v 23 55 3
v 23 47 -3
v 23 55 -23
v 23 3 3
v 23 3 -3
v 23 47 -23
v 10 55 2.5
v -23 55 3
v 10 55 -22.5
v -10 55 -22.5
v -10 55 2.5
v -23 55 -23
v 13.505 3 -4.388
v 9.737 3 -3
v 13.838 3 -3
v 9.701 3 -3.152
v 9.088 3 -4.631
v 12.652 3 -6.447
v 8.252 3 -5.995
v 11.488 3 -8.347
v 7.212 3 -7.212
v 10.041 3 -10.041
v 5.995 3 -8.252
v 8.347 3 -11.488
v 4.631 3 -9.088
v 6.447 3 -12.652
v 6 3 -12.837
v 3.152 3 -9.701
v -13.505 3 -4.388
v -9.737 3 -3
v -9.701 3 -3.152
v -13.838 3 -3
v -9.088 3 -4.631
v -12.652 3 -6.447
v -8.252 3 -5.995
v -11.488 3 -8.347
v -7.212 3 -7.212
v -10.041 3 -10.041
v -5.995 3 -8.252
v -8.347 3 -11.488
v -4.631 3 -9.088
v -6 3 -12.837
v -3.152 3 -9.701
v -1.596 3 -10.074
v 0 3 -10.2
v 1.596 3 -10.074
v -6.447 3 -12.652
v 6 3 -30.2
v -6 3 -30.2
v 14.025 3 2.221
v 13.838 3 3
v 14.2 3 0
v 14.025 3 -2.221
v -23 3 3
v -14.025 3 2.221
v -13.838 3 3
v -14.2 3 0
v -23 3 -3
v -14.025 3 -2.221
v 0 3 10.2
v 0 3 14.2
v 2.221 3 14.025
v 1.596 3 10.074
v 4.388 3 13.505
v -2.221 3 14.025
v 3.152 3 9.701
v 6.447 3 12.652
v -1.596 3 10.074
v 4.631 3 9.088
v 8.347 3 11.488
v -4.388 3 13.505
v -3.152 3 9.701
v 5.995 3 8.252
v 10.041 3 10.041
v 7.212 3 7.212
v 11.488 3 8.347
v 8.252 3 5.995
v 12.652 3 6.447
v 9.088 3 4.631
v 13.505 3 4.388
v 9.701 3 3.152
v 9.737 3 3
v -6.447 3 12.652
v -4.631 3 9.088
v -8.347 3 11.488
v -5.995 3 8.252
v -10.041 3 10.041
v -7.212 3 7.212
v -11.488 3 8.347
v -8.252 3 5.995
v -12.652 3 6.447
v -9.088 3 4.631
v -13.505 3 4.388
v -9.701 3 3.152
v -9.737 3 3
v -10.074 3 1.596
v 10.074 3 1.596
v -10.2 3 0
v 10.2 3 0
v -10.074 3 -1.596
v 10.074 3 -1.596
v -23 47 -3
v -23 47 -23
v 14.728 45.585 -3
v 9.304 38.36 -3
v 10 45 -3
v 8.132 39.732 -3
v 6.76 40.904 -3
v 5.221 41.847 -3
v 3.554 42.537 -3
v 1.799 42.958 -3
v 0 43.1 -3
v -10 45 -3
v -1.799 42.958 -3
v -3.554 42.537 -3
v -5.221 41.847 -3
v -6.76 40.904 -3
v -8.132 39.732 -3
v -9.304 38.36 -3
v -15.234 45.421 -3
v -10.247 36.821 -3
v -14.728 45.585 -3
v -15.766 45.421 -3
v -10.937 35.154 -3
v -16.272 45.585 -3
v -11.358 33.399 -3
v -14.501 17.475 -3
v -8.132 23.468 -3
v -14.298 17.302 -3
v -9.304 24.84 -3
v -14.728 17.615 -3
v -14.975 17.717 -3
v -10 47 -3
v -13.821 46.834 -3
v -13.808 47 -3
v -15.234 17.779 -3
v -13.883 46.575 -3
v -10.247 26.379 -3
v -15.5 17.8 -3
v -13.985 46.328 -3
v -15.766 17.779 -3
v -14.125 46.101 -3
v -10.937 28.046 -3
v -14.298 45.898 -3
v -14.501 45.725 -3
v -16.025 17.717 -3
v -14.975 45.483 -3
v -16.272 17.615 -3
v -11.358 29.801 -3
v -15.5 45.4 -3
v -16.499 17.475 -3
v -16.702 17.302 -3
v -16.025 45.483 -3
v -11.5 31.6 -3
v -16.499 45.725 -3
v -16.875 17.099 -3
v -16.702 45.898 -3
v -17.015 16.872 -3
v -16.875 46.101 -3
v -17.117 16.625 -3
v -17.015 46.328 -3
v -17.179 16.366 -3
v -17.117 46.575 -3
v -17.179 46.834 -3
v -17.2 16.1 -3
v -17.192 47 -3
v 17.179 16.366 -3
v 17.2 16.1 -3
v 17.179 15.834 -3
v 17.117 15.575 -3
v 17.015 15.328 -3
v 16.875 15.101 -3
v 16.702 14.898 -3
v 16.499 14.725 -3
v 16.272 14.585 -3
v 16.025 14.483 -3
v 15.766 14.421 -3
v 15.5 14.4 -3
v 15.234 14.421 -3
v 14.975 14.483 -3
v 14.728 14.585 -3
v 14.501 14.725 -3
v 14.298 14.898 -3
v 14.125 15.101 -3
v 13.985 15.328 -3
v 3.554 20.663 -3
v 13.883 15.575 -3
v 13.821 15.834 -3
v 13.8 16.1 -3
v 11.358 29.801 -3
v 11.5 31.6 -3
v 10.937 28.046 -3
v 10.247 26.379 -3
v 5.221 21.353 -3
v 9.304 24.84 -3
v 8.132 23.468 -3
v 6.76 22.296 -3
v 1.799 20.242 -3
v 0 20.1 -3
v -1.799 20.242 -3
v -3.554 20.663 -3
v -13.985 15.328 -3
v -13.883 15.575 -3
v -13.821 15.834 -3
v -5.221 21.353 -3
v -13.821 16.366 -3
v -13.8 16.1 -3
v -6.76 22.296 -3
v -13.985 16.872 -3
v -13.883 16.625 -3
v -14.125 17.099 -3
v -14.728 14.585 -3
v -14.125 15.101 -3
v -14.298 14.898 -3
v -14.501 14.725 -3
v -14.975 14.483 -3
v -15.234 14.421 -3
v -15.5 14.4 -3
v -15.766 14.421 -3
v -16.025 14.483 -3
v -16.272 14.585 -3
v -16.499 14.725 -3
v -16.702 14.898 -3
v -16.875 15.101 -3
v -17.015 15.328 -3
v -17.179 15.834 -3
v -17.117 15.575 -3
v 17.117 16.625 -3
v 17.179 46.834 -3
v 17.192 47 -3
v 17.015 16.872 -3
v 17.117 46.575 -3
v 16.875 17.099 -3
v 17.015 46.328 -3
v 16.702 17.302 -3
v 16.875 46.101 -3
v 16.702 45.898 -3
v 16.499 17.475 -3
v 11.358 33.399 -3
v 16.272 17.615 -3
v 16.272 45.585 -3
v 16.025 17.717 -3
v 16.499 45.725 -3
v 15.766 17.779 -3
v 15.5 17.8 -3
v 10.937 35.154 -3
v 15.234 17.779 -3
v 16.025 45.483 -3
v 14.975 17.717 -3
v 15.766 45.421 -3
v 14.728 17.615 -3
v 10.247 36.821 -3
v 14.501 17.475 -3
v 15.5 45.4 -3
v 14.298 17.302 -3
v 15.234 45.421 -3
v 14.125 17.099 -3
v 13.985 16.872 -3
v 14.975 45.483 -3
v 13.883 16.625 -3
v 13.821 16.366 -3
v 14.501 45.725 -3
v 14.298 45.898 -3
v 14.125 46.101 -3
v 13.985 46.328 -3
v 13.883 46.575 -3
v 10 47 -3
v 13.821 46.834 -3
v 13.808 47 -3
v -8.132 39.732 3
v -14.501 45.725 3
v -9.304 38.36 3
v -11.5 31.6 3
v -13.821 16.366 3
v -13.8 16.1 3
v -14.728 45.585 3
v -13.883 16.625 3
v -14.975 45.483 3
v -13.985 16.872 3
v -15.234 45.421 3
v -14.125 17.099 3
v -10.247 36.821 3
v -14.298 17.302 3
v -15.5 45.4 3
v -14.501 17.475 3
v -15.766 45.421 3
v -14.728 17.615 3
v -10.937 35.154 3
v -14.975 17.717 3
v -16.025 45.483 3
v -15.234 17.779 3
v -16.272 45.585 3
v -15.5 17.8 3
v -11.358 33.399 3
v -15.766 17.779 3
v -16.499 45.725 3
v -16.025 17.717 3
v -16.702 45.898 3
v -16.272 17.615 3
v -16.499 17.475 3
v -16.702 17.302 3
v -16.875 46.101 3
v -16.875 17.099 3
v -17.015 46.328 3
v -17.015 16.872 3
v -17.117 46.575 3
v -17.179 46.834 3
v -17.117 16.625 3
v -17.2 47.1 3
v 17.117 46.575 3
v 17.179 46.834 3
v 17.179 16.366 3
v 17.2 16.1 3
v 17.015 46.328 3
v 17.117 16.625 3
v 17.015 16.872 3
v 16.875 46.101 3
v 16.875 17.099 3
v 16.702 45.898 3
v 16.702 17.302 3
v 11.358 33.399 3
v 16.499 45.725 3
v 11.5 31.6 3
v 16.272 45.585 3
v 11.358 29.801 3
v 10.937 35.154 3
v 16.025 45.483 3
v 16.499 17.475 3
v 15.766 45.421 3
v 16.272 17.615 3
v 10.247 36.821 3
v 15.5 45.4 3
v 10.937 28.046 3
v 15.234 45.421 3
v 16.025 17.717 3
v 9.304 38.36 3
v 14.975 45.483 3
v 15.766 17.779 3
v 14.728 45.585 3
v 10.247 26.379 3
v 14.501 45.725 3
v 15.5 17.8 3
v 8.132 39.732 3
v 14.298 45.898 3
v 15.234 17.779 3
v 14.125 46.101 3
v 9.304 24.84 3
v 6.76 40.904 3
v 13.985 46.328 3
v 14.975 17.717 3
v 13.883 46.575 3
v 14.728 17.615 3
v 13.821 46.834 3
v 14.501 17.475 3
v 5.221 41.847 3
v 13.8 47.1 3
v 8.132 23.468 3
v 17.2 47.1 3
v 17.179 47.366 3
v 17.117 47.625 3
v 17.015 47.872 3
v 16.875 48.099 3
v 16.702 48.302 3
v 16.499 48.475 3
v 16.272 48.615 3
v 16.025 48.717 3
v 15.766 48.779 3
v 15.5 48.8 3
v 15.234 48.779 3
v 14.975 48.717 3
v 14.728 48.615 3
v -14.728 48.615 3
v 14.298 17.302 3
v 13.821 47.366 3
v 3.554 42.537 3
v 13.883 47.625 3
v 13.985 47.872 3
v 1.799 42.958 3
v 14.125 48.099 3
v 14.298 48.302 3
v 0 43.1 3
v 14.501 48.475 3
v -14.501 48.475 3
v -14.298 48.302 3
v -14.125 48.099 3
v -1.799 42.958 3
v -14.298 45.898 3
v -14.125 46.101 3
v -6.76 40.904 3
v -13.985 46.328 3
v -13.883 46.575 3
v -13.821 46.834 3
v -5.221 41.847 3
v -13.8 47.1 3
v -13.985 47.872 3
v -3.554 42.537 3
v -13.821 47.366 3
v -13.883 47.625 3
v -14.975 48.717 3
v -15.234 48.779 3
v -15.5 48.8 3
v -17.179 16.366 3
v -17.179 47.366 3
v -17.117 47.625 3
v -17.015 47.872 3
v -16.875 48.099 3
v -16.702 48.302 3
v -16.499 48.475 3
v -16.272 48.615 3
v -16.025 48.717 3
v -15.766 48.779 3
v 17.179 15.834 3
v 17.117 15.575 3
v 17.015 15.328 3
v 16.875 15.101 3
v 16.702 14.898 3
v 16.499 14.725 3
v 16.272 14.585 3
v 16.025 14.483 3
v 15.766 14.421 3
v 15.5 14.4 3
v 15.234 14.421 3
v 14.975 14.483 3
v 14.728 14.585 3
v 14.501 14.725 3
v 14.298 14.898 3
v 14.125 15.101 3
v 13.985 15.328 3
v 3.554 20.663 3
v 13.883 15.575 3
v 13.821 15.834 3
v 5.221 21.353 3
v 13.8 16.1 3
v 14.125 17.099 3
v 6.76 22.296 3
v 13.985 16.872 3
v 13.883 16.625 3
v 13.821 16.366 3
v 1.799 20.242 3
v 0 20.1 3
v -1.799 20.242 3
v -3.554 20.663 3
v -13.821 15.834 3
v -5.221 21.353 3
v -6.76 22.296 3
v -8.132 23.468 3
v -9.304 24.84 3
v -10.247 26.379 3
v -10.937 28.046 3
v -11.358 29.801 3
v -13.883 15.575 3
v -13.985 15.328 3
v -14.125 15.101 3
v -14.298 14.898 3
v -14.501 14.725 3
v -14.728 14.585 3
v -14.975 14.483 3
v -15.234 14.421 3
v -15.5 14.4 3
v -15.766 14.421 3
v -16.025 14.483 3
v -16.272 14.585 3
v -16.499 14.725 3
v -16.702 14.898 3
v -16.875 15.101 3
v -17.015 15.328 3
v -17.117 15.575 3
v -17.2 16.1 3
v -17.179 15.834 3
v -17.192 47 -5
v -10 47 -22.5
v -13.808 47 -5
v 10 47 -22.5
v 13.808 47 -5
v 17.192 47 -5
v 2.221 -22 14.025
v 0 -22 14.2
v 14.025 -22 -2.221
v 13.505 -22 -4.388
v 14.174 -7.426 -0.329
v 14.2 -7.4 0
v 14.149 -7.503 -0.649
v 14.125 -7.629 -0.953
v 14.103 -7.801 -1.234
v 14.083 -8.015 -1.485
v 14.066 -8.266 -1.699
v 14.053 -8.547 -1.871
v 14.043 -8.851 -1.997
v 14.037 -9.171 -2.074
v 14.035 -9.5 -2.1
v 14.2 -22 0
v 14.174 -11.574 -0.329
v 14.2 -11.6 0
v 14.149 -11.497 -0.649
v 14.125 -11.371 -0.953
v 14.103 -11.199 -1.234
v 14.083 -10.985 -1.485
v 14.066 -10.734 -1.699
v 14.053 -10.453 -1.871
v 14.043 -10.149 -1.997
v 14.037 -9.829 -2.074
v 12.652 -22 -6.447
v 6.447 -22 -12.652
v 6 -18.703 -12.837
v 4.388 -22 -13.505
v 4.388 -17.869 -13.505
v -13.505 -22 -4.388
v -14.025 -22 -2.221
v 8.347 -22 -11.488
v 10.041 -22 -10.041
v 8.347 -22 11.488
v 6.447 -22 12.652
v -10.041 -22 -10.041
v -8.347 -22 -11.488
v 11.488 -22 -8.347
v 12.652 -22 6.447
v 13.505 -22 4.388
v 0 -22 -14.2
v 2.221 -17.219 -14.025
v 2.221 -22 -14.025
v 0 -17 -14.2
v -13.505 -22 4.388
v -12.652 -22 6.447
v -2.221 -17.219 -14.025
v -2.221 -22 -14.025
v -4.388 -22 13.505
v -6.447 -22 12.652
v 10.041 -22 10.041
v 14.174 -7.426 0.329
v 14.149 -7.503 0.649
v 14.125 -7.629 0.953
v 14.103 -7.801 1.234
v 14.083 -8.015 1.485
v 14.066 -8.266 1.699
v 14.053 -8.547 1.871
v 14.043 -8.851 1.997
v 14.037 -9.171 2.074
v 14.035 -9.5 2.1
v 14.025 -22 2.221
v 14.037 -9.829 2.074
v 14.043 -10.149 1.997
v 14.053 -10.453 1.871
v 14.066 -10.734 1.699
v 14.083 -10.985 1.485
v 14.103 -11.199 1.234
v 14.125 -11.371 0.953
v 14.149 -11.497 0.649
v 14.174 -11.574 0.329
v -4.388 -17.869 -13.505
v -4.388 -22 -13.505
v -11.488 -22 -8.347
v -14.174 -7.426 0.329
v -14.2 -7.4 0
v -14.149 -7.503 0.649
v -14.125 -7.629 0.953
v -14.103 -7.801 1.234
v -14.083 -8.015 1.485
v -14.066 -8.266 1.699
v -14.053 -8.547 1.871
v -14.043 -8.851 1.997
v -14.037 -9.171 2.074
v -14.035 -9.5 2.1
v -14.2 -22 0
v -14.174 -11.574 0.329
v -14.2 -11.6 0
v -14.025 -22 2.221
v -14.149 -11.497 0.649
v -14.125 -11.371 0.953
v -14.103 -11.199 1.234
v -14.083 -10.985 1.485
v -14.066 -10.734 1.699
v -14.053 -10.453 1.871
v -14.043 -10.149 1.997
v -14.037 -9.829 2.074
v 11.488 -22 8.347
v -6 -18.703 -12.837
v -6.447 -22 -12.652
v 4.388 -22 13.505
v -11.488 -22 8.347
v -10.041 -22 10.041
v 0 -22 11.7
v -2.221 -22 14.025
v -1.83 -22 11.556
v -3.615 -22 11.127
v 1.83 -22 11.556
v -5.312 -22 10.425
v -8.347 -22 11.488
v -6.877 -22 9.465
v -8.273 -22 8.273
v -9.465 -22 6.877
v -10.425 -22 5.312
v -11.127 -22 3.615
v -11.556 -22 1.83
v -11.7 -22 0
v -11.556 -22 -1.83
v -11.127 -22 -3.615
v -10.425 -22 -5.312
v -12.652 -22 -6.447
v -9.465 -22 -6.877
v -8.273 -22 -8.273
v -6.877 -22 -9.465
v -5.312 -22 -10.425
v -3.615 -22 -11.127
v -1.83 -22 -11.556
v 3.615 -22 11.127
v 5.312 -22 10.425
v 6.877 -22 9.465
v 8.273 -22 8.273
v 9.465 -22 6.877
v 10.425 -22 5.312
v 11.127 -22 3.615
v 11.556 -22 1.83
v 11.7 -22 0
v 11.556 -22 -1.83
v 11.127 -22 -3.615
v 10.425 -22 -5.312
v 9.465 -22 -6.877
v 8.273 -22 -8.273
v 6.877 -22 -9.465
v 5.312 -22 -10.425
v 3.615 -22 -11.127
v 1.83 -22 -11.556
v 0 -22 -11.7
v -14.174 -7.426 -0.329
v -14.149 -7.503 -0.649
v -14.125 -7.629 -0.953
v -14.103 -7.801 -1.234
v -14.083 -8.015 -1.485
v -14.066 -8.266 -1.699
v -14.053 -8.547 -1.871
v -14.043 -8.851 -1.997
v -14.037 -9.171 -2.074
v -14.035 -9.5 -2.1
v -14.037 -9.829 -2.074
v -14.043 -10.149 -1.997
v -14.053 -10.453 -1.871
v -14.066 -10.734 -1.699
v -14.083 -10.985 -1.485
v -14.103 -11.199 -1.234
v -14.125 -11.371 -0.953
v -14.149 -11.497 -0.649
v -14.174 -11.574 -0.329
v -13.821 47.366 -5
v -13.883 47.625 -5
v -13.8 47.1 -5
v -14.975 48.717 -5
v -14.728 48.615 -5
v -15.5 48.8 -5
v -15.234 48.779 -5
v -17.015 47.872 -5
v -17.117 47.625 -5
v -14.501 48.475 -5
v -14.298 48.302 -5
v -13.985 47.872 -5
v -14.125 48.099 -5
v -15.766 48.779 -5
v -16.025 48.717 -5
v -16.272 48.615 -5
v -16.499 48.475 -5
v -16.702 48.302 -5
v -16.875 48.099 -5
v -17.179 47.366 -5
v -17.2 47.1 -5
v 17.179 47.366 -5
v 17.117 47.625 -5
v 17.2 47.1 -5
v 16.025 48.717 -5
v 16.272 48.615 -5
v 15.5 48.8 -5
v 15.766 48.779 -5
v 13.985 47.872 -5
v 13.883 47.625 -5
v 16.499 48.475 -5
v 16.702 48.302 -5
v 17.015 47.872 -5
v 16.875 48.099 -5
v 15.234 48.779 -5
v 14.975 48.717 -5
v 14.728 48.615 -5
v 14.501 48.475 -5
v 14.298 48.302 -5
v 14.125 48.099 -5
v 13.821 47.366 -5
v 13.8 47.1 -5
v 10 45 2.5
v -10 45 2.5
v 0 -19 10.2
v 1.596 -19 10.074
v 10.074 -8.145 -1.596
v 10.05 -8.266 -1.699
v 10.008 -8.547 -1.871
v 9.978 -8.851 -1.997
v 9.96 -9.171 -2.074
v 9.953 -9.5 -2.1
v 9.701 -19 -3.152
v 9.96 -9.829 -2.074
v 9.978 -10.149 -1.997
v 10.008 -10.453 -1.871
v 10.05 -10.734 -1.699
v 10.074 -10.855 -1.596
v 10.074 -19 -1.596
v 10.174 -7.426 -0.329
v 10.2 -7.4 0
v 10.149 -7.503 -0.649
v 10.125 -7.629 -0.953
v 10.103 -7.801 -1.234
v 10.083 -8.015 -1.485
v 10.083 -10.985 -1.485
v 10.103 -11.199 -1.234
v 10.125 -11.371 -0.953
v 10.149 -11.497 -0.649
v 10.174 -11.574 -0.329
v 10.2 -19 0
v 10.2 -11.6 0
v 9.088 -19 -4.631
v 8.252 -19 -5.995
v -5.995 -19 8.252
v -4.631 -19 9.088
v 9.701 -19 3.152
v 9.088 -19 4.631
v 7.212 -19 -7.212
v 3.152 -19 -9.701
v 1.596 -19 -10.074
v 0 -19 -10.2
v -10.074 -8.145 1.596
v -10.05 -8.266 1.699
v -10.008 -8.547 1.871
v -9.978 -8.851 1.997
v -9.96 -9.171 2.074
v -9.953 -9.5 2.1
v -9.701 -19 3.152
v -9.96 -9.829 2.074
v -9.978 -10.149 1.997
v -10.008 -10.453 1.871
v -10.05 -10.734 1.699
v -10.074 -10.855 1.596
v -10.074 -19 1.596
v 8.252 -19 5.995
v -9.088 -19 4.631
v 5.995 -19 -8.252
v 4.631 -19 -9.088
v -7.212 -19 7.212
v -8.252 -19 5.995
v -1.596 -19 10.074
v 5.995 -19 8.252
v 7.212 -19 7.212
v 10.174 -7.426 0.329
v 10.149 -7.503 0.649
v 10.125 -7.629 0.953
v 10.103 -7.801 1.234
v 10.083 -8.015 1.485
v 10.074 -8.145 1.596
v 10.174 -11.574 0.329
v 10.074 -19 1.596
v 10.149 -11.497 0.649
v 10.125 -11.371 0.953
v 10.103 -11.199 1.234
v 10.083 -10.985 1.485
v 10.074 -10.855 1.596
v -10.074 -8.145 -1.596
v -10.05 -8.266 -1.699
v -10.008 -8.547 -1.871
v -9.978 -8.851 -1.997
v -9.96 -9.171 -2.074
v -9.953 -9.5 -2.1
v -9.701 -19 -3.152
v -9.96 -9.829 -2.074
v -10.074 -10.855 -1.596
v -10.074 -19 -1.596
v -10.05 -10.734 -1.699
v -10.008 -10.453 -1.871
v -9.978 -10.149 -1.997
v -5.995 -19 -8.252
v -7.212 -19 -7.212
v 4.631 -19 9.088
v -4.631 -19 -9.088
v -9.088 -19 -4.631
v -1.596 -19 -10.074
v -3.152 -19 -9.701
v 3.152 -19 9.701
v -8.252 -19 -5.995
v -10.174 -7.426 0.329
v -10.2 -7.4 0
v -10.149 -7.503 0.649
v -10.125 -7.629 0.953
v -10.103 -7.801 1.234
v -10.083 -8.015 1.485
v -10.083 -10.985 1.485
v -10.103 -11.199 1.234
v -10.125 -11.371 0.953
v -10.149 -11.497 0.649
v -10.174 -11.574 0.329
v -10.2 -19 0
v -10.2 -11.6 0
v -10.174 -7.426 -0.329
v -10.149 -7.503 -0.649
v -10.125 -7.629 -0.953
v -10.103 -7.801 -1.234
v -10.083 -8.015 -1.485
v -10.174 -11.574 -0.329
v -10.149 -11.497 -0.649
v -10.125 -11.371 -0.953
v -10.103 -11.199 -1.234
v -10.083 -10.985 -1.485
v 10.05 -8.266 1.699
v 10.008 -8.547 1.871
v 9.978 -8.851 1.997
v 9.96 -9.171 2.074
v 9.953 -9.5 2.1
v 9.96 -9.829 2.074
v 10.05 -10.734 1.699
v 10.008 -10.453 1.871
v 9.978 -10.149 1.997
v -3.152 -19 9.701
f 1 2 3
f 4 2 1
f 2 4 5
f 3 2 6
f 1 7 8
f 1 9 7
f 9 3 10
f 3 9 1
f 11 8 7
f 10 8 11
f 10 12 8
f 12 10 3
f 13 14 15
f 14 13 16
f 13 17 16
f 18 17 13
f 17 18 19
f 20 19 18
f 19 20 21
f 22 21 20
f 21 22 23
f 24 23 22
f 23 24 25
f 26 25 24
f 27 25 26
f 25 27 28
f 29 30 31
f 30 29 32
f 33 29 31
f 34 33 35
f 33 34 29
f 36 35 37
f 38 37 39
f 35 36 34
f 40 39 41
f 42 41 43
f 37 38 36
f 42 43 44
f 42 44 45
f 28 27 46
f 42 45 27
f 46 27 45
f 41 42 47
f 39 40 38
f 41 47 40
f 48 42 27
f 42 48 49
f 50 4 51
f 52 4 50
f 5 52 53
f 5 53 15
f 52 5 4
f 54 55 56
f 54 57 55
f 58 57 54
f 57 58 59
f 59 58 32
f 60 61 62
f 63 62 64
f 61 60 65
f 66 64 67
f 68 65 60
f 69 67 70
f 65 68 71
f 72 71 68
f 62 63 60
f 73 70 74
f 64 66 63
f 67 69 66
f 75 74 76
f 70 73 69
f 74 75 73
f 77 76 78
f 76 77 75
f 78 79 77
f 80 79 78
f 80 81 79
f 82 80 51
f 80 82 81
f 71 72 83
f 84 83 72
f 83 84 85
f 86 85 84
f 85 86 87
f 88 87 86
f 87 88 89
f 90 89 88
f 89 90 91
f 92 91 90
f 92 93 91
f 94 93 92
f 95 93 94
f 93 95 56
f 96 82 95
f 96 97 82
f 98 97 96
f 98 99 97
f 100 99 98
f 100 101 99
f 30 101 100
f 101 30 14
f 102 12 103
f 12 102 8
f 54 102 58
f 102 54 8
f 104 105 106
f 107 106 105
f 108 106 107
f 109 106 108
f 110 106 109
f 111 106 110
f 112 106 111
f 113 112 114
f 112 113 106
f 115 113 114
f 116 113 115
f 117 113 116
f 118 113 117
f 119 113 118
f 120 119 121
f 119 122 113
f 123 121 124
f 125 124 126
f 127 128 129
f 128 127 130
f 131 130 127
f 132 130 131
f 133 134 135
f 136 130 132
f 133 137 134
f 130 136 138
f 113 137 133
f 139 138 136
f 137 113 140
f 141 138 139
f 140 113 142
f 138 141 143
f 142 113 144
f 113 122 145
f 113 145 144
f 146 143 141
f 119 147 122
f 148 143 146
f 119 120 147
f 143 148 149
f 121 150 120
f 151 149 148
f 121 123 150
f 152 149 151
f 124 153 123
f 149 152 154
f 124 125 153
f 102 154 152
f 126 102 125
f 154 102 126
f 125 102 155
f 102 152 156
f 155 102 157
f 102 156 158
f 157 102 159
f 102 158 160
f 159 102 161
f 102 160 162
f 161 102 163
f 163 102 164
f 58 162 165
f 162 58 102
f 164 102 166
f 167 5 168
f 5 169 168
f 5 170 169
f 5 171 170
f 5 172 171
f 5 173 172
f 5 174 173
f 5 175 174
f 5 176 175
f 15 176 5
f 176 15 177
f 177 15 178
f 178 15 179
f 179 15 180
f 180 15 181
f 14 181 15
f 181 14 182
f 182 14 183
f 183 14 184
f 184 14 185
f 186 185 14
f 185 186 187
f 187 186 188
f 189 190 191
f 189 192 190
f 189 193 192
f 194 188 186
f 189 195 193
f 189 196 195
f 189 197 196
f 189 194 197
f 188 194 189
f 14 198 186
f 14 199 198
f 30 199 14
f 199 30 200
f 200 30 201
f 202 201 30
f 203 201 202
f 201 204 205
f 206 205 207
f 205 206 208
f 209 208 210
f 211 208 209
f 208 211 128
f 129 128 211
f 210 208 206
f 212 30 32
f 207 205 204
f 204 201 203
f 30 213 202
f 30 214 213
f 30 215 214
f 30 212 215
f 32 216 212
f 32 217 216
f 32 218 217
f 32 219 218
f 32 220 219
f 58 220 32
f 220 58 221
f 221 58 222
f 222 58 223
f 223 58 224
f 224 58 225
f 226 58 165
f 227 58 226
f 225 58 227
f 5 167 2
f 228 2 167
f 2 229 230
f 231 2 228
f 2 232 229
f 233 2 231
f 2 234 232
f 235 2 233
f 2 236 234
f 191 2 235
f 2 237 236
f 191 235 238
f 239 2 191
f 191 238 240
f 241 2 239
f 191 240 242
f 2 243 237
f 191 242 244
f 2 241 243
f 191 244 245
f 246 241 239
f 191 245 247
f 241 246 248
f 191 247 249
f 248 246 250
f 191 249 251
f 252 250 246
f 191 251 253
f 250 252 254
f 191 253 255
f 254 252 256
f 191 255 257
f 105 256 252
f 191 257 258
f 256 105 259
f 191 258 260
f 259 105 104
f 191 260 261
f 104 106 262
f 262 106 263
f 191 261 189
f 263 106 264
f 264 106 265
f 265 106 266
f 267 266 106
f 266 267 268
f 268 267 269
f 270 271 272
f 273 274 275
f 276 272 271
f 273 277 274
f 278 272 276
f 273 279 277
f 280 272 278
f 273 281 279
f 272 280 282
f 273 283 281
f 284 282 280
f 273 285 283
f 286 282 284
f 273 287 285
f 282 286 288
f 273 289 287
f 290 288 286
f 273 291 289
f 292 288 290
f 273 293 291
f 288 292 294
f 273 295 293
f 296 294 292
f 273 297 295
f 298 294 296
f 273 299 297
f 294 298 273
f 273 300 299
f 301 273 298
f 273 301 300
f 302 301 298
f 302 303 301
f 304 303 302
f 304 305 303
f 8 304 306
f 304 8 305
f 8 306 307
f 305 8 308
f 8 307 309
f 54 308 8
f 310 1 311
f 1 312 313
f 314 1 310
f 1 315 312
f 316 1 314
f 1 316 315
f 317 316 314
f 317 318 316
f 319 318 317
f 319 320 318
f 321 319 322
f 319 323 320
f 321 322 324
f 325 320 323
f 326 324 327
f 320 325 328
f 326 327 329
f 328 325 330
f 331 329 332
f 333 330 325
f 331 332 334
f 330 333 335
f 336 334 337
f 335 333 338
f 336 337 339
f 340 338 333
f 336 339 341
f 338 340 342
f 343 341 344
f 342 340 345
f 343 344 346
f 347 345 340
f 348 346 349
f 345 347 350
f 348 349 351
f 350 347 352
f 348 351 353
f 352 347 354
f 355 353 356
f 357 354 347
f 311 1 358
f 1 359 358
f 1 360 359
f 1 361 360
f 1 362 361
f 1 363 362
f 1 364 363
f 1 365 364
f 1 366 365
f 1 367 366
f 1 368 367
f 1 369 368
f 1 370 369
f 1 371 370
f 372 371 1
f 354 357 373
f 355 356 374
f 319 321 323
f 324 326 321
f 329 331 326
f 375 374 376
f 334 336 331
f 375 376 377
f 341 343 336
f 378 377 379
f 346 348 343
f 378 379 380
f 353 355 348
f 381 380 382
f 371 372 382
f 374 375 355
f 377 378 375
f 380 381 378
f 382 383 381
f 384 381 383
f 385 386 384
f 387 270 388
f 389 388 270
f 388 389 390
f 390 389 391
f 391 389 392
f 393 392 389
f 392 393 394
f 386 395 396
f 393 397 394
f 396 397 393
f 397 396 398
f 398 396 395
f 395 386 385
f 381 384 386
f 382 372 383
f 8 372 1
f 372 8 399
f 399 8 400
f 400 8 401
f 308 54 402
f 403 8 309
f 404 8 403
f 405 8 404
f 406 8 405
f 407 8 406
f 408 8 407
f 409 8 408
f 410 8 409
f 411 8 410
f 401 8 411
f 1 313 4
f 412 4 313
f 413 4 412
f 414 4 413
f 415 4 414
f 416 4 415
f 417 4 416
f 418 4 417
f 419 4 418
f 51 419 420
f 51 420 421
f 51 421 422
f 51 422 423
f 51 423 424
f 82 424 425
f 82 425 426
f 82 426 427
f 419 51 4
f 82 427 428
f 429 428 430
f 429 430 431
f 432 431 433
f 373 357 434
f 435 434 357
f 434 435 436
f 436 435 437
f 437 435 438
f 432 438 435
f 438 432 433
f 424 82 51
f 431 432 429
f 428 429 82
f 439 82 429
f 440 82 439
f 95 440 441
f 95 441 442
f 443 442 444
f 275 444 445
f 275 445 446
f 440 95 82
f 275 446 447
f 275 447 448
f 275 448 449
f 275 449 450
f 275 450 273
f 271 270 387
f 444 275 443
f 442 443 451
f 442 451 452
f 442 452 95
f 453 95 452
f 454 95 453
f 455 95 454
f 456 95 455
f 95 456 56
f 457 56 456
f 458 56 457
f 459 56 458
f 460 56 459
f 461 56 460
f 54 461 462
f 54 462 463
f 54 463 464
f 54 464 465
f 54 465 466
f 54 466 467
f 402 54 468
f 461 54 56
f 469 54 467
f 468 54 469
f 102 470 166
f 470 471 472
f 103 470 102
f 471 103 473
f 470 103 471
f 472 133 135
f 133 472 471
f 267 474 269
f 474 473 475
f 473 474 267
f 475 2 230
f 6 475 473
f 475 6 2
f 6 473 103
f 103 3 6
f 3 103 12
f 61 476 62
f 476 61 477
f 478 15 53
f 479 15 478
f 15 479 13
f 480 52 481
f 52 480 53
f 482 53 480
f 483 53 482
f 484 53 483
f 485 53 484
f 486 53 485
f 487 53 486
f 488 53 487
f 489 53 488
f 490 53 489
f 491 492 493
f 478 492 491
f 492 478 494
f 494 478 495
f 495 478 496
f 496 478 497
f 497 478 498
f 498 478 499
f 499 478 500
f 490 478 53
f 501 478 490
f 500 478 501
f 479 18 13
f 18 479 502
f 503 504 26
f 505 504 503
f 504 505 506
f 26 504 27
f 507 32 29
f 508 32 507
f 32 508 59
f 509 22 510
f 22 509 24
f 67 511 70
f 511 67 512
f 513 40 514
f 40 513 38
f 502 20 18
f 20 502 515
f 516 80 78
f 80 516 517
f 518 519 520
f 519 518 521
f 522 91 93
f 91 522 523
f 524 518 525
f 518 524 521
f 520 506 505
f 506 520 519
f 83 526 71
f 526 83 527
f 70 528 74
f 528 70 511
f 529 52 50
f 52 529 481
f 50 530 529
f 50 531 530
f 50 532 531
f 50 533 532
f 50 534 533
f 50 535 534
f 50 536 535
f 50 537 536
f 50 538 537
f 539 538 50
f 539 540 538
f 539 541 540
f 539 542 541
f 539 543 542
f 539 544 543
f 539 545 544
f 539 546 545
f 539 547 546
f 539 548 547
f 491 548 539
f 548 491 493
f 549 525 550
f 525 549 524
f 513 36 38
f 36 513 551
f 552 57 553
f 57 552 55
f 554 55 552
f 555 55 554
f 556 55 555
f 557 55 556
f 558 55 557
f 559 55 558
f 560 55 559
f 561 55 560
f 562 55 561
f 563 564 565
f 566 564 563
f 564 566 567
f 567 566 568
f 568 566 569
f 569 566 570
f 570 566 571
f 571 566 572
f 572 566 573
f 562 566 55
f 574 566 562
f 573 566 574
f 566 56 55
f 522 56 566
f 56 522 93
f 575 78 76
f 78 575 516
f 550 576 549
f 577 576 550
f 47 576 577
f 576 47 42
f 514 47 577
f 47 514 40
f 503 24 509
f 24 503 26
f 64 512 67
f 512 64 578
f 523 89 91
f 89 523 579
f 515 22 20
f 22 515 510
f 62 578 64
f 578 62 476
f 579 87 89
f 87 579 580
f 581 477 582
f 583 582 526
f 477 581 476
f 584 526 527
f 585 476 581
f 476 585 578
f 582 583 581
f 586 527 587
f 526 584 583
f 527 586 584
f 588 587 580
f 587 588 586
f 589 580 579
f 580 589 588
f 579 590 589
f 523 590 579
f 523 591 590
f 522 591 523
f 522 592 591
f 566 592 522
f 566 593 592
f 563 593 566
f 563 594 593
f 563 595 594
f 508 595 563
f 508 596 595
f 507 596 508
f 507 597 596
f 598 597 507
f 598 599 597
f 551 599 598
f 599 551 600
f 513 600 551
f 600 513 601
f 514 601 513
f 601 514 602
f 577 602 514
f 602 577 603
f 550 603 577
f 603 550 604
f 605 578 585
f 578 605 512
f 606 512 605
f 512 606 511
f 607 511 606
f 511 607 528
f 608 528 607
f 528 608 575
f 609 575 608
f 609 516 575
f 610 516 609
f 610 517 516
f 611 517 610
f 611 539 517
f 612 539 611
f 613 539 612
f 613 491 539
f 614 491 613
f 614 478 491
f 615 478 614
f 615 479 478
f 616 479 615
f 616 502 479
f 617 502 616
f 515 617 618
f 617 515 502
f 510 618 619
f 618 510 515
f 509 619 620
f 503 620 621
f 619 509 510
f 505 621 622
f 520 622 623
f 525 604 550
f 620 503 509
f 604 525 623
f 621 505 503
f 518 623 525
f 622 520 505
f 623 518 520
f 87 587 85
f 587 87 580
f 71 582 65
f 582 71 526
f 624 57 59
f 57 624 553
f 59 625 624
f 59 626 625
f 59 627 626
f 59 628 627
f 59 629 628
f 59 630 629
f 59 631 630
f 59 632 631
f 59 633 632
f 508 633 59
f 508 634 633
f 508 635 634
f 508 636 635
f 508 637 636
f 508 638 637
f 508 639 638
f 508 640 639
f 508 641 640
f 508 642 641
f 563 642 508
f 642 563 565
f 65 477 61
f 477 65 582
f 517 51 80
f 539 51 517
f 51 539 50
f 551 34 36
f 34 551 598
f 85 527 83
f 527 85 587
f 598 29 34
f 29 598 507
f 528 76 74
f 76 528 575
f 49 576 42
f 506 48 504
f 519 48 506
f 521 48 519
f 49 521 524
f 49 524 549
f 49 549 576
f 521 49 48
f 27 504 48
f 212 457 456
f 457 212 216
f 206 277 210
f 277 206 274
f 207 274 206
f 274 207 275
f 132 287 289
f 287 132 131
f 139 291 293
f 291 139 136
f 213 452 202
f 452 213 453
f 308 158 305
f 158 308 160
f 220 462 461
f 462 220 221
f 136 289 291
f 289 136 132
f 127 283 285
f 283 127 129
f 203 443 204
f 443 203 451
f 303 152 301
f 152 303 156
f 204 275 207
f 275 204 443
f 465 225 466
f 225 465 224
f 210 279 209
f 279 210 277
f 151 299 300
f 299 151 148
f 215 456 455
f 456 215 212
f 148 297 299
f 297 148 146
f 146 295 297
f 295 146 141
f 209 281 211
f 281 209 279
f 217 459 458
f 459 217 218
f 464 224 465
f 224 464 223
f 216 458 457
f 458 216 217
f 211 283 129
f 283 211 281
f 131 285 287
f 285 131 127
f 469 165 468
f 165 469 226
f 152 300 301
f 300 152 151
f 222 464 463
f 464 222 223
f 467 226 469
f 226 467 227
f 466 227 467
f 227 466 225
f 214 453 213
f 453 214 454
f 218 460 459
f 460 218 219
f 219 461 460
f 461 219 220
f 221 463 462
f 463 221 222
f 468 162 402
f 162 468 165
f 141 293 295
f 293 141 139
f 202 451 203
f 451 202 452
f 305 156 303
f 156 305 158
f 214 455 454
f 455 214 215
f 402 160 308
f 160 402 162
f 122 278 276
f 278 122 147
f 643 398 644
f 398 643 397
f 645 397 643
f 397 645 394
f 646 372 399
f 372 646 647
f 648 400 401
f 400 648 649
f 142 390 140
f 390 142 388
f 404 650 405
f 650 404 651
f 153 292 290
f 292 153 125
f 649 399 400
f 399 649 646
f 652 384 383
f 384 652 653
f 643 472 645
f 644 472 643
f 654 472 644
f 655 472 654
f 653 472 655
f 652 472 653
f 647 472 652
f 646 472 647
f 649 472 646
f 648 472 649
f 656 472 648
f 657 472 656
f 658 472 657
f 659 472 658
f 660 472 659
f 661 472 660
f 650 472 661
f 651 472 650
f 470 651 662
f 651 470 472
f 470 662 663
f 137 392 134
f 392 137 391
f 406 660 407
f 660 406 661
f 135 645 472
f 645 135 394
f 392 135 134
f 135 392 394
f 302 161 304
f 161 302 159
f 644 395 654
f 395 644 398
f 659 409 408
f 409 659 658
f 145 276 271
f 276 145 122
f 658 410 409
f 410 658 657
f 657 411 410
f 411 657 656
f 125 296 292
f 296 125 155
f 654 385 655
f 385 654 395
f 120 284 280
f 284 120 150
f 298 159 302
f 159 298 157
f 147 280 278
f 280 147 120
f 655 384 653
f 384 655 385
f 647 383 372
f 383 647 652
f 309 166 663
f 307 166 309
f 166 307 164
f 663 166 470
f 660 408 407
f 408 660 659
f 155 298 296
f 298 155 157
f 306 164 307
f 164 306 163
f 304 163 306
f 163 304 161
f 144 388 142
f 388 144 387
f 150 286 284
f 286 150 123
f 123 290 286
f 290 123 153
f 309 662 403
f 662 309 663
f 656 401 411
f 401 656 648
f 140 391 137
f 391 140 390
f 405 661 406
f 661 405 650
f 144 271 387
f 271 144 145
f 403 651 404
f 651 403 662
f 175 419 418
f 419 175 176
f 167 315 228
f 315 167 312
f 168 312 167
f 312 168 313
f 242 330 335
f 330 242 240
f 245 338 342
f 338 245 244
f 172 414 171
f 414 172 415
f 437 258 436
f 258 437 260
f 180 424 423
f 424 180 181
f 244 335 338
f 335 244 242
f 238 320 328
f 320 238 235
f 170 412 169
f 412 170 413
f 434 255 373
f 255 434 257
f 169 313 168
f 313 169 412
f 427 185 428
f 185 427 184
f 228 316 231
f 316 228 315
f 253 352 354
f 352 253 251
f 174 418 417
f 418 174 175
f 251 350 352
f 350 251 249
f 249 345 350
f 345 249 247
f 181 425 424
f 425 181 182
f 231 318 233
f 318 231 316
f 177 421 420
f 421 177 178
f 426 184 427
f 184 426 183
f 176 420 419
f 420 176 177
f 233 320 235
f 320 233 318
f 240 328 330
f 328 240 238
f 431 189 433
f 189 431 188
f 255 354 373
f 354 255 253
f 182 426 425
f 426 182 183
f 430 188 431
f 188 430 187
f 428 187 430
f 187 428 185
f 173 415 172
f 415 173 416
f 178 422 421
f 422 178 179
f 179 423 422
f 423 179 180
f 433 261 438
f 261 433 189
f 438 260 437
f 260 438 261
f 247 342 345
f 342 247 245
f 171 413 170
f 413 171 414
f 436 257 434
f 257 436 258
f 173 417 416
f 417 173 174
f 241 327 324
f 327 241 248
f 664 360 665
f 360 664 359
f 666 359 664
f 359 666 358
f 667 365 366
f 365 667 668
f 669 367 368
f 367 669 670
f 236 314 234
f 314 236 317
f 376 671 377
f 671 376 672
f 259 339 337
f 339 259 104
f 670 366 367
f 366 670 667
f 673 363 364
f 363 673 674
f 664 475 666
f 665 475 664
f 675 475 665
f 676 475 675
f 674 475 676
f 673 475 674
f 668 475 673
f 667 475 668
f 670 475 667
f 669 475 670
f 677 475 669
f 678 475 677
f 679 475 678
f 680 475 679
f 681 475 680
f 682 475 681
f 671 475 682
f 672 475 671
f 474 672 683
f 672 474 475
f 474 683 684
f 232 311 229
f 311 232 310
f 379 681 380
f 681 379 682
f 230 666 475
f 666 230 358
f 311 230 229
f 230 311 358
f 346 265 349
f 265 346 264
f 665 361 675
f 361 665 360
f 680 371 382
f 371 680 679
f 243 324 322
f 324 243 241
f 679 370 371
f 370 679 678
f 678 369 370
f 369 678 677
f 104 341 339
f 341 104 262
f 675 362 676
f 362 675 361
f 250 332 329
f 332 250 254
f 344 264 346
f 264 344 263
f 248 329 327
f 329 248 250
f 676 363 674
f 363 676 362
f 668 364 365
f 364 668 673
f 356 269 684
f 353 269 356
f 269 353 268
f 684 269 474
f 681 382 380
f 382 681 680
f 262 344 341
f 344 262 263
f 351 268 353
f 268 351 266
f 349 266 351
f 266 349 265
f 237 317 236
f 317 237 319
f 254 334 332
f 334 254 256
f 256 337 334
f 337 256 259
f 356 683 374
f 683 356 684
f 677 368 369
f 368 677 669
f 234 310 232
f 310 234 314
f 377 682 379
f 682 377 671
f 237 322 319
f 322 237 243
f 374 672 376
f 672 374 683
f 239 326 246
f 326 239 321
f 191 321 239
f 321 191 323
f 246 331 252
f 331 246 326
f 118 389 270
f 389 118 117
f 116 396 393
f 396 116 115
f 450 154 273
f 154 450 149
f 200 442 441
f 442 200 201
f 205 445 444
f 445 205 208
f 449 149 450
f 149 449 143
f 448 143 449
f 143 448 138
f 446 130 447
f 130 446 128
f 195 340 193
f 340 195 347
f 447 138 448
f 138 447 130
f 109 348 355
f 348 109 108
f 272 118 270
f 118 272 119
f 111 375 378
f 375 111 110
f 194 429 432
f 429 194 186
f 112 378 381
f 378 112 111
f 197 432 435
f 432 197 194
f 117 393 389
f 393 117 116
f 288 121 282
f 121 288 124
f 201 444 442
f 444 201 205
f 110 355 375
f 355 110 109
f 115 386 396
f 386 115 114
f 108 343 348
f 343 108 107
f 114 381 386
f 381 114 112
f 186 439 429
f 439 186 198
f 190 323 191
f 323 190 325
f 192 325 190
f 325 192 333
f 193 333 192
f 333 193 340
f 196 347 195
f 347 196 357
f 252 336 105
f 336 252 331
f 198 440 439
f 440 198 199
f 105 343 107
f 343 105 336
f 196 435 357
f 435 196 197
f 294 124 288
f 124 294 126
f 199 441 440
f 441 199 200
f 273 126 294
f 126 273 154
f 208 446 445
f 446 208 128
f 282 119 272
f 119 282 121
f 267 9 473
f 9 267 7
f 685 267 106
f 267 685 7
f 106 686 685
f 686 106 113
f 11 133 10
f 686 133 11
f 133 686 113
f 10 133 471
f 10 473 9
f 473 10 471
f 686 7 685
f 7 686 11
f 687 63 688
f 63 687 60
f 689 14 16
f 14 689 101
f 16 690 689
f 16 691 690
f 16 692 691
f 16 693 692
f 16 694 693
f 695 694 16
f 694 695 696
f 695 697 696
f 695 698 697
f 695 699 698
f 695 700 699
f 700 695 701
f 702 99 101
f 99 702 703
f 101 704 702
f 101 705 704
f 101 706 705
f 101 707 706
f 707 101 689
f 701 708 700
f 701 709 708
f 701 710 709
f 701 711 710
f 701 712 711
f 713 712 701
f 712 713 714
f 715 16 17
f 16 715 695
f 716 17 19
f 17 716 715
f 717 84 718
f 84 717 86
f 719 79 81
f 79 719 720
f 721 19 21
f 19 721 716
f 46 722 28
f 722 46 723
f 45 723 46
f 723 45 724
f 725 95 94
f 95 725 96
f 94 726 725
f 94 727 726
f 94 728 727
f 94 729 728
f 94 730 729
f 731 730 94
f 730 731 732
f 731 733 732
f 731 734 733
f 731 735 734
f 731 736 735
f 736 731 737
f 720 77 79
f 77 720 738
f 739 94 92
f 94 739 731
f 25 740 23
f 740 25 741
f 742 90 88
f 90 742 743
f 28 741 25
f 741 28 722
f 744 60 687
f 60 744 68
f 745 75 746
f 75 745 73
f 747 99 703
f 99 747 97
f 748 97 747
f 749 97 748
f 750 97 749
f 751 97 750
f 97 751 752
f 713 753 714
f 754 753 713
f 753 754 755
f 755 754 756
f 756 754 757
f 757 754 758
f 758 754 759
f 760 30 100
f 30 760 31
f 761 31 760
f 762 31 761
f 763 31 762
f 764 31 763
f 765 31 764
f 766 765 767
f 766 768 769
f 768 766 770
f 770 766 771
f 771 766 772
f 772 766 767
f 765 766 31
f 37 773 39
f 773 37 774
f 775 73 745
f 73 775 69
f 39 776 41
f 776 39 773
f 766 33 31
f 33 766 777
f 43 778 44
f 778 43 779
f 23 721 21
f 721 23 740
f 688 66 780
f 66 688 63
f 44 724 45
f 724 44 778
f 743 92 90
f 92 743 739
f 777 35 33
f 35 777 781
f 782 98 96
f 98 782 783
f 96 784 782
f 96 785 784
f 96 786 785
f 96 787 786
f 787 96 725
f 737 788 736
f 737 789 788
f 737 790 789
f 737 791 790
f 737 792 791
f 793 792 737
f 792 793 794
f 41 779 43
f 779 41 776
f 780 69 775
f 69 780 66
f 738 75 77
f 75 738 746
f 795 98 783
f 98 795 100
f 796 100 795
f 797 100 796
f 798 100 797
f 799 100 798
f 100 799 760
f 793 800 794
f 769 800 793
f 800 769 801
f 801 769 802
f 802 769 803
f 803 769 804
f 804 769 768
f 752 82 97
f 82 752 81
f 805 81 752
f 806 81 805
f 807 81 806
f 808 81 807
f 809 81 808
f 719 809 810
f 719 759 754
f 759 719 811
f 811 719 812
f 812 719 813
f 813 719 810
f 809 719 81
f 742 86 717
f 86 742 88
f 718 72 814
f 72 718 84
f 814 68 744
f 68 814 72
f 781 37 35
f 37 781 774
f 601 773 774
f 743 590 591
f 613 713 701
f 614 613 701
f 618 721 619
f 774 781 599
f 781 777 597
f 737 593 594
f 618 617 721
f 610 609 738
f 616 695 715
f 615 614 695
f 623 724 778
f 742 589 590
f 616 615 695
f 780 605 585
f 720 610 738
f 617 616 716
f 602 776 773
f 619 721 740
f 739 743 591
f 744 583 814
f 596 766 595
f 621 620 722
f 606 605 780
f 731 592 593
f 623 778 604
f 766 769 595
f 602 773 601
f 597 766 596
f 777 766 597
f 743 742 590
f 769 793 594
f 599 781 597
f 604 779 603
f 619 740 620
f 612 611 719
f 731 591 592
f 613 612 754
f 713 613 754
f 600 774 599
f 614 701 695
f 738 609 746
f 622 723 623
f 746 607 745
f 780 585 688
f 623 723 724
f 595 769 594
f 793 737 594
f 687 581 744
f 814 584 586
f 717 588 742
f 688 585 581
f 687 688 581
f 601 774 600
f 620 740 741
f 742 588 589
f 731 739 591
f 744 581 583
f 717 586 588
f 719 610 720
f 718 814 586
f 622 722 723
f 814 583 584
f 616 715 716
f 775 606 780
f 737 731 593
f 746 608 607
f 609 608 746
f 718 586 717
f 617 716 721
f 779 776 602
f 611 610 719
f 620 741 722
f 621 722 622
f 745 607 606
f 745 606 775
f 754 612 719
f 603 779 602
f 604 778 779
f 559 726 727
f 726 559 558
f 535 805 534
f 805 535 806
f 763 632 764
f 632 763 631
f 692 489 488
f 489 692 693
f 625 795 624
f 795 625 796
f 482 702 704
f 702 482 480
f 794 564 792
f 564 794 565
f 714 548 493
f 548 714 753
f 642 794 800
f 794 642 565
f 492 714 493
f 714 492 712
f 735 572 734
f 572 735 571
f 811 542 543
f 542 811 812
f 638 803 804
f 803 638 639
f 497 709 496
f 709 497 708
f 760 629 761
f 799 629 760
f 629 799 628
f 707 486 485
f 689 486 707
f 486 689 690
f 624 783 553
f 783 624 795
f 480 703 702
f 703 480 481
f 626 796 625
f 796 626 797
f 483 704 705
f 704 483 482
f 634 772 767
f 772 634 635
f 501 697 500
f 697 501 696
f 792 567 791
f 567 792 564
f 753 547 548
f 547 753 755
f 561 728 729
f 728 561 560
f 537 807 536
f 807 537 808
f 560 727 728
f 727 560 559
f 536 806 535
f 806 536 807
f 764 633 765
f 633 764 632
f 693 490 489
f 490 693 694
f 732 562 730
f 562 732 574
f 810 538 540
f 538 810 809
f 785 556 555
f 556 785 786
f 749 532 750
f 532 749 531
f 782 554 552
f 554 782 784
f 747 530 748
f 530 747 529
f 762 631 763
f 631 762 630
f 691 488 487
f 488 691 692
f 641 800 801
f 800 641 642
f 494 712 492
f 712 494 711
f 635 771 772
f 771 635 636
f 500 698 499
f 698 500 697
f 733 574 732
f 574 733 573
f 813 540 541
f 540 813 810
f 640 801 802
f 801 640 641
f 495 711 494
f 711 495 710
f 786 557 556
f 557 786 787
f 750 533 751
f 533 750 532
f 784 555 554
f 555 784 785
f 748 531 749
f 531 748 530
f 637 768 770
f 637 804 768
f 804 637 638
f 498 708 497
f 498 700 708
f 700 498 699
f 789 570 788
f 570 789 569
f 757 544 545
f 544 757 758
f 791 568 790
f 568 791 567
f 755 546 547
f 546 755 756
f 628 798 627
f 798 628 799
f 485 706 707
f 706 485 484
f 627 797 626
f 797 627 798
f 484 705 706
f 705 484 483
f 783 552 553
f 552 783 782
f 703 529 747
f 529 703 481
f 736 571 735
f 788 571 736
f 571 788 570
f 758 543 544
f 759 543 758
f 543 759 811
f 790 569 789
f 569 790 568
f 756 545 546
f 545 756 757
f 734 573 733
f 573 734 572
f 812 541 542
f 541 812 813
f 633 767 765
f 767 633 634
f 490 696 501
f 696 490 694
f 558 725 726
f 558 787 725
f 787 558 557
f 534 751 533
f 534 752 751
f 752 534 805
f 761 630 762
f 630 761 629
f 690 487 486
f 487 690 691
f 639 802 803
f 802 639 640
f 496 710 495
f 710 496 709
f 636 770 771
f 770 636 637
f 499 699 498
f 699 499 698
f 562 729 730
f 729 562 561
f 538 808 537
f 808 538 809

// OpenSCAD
// file: tower_sheave.scad
// ====================================================================
// Tower End Sheave Wheel (100% 3D-Printable - Flat on Bed at Z = 0)
// Used at Tower A and Tower B.
// - High flanges to retain cable line securely.
// - 5mm central bore: spins on an M4/M5 bolt in Phase 1;
//   directly accepts a NEMA 17 D-shaft in Phase 2 (includes M3 grub screw hole).
// ====================================================================

$fn = 60;

// Dimensions (mm)
sheave_outer_dia = 54.0; // Outer flange diameter
sheave_pitch_dia = 44.0; // Cable track diameter
sheave_width     = 8.0;  // Total sheave rim width
hub_h            = 12.0; // Extended center hub for shaft grip and standoff
bore_dia         = 5.2;  // 5mm motor shaft / M5 screw clearance
grub_screw_dia   = 3.0;  // M3 set/grub screw for Phase 2 motor lock
hub_lift         = (hub_h - sheave_width) / 2; // 2.0mm standoff from bed

module tower_sheave() {
    difference() {
        union() {
            // Main sheave disc (lifted by hub standoff)
            translate([0, 0, hub_lift])
                cylinder(d = sheave_outer_dia, h = sheave_width);
            // Extended center hub (starts at Z = 0)
            cylinder(d = 14.0, h = hub_h);
        }
        
        // Center shaft bore
        translate([0, 0, -1])
            cylinder(d = bore_dia, h = hub_h + 2);
        
        // Deep cable groove
        translate([0, 0, hub_h / 2])
            rotate_extrude(convexity = 10) {
                translate([sheave_pitch_dia / 2, 0, 0])
                    polygon([
                        [-2.0, 0],
                        [6.0, 3.2],
                        [6.0, -3.2]
                    ]);
            }
        
        // Radial M3 grub screw hole (for clamping onto motor shaft in Phase 2)
        translate([0, 0, hub_h / 2])
            rotate([90, 0, 0])
                cylinder(d = grub_screw_dia, h = 20, center = false);
            
        // Decorative weight-reduction spoke cutouts (holiday snowflake / star style)
        for (a = [0 : 60 : 300]) {
            rotate([0, 0, a])
                translate([16, 0, -1])
                    cylinder(d = 8, h = hub_h + 2);
        }
    }
}

// Render flat on bed at Z = 0
tower_sheave();
// main file
// ====================================================================
// Tower Head Station A: Drive-Ready Station (100% 3D-Printable)
// 
// Dual-Role Design:
// - Phase 1: Mounts a passive sheave wheel on an M5 bolt axle.
// - Phase 2: Directly bolts to a NEMA 17 stepper motor (4x M3 holes on 31mm centers)
//   without needing any modifications or reprints!
// Bottom has a 20mm socket to mount onto a wooden dowel, PVC pipe, or printed truss.
// ====================================================================

use <tower_sheave.scad>;

$fn = 40;

// Dimensions
bracket_w        = 46.0; // Width of mounting face
bracket_h        = 52.0; // Height of mounting plate
plate_th         = 6.0;  // Thickness of plate
nema17_hole_dist = 31.0; // NEMA 17 standard mounting hole spacing
nema17_pilot_d   = 23.0; // NEMA 17 center collar clearance
m3_hole_d        = 3.4;  // M3 bolt clearance
socket_inner_d   = 20.4; // Fits 20mm (or 3/4 inch) dowel/pipe
socket_wall      = 4.0;
socket_depth     = 25.0;

module tower_head_a() {
    difference() {
        union() {
            // Main motor/axle vertical mounting faceplate
            translate([0, 0, bracket_h / 2])
                cube([bracket_w, plate_th, bracket_h], center = true);

            // Overhead cable guide horn
            translate([0, 10, bracket_h - 4])
                cube([bracket_w, 20 + plate_th, 8], center = true);

            // Lower mast mounting socket
            translate([0, 0, -socket_depth / 2])
                cylinder(d = socket_inner_d + (socket_wall * 2), h = socket_depth, center = true);
                
            // Triangular gussets for structural rigidity
            translate([0, socket_inner_d / 2, 0])
                rotate([0, 90, 0])
                    linear_extrude(height = 12, center = true)
                        polygon([[0, 0], [25, 0], [0, 20]]);
        }

        // Center pilot hole (for motor collar or Phase 1 M5 axle bolt)
        translate([0, 0, bracket_h * 0.55])
            rotate([90, 0, 0])
                cylinder(d = nema17_pilot_d, h = plate_th + 4, center = true);

        // 4x NEMA 17 mounting holes (31mm square pattern)
        for (dx = [-nema17_hole_dist / 2, nema17_hole_dist / 2]) {
            for (dz = [-nema17_hole_dist / 2, nema17_hole_dist / 2]) {
                translate([dx, 0, (bracket_h * 0.55) + dz])
                    rotate([90, 0, 0])
                        cylinder(d = m3_hole_d, h = plate_th + 4, center = true);
            }
        }

        // Cable path slot through the overhead horn
        translate([0, 10, bracket_h - 4])
            cube([20, 25, 12], center = true);

        // Mast socket cavity (bottom) with 45-degree self-aligning lead-in chamfer
        translate([0, 0, -socket_depth / 2 - 1])
            cylinder(d = socket_inner_d, h = socket_depth + 2, center = true);
        translate([0, 0, -socket_depth])
            cylinder(d1 = socket_inner_d + 3.0, d2 = socket_inner_d, h = 3.0);

        // Mast cross-pin clamp hole
        translate([0, 0, -socket_depth / 2])
            rotate([0, 90, 0])
                cylinder(d = 4.2, h = socket_inner_d + 12, center = true);

        // Embossed Station Identification on face: "A - DRIVE"
        translate([-bracket_w / 2 + 3, -plate_th / 2 - 0.1, 4])
            rotate([90, 0, 0])
                linear_extrude(height = 0.8)
                    text("A - DRIVE", size = 4.2, font = "Liberation Sans:style=Bold");
    }
}

// Visual preview with sheave wheel attached
module preview_station_a() {
    tower_head_a();
    #translate([0, plate_th / 2 + 8, bracket_h * 0.55])
        rotate([90, 0, 0])
            tower_sheave();
}

// ====================================================================
// Selection
// ====================================================================
// "print"      -> Upright resting flat on socket rim at Z = 0
// "print_flat" -> Laid flat on its rear motor plate at Z = 0 (ZERO supports!)
// "preview"    -> Upright with sheave wheel attached
mode = "print_flat";

if (mode == "print") {
    translate([0, 0, socket_depth])
        tower_head_a();
} else if (mode == "print_flat") {
    // Laid flat on rear face of motor plate at Z = 0
    translate([0, plate_th / 2, 0])
        rotate([-90, 0, 0])
            tower_head_a();
} else if (mode == "preview") {
    preview_station_a();
}
